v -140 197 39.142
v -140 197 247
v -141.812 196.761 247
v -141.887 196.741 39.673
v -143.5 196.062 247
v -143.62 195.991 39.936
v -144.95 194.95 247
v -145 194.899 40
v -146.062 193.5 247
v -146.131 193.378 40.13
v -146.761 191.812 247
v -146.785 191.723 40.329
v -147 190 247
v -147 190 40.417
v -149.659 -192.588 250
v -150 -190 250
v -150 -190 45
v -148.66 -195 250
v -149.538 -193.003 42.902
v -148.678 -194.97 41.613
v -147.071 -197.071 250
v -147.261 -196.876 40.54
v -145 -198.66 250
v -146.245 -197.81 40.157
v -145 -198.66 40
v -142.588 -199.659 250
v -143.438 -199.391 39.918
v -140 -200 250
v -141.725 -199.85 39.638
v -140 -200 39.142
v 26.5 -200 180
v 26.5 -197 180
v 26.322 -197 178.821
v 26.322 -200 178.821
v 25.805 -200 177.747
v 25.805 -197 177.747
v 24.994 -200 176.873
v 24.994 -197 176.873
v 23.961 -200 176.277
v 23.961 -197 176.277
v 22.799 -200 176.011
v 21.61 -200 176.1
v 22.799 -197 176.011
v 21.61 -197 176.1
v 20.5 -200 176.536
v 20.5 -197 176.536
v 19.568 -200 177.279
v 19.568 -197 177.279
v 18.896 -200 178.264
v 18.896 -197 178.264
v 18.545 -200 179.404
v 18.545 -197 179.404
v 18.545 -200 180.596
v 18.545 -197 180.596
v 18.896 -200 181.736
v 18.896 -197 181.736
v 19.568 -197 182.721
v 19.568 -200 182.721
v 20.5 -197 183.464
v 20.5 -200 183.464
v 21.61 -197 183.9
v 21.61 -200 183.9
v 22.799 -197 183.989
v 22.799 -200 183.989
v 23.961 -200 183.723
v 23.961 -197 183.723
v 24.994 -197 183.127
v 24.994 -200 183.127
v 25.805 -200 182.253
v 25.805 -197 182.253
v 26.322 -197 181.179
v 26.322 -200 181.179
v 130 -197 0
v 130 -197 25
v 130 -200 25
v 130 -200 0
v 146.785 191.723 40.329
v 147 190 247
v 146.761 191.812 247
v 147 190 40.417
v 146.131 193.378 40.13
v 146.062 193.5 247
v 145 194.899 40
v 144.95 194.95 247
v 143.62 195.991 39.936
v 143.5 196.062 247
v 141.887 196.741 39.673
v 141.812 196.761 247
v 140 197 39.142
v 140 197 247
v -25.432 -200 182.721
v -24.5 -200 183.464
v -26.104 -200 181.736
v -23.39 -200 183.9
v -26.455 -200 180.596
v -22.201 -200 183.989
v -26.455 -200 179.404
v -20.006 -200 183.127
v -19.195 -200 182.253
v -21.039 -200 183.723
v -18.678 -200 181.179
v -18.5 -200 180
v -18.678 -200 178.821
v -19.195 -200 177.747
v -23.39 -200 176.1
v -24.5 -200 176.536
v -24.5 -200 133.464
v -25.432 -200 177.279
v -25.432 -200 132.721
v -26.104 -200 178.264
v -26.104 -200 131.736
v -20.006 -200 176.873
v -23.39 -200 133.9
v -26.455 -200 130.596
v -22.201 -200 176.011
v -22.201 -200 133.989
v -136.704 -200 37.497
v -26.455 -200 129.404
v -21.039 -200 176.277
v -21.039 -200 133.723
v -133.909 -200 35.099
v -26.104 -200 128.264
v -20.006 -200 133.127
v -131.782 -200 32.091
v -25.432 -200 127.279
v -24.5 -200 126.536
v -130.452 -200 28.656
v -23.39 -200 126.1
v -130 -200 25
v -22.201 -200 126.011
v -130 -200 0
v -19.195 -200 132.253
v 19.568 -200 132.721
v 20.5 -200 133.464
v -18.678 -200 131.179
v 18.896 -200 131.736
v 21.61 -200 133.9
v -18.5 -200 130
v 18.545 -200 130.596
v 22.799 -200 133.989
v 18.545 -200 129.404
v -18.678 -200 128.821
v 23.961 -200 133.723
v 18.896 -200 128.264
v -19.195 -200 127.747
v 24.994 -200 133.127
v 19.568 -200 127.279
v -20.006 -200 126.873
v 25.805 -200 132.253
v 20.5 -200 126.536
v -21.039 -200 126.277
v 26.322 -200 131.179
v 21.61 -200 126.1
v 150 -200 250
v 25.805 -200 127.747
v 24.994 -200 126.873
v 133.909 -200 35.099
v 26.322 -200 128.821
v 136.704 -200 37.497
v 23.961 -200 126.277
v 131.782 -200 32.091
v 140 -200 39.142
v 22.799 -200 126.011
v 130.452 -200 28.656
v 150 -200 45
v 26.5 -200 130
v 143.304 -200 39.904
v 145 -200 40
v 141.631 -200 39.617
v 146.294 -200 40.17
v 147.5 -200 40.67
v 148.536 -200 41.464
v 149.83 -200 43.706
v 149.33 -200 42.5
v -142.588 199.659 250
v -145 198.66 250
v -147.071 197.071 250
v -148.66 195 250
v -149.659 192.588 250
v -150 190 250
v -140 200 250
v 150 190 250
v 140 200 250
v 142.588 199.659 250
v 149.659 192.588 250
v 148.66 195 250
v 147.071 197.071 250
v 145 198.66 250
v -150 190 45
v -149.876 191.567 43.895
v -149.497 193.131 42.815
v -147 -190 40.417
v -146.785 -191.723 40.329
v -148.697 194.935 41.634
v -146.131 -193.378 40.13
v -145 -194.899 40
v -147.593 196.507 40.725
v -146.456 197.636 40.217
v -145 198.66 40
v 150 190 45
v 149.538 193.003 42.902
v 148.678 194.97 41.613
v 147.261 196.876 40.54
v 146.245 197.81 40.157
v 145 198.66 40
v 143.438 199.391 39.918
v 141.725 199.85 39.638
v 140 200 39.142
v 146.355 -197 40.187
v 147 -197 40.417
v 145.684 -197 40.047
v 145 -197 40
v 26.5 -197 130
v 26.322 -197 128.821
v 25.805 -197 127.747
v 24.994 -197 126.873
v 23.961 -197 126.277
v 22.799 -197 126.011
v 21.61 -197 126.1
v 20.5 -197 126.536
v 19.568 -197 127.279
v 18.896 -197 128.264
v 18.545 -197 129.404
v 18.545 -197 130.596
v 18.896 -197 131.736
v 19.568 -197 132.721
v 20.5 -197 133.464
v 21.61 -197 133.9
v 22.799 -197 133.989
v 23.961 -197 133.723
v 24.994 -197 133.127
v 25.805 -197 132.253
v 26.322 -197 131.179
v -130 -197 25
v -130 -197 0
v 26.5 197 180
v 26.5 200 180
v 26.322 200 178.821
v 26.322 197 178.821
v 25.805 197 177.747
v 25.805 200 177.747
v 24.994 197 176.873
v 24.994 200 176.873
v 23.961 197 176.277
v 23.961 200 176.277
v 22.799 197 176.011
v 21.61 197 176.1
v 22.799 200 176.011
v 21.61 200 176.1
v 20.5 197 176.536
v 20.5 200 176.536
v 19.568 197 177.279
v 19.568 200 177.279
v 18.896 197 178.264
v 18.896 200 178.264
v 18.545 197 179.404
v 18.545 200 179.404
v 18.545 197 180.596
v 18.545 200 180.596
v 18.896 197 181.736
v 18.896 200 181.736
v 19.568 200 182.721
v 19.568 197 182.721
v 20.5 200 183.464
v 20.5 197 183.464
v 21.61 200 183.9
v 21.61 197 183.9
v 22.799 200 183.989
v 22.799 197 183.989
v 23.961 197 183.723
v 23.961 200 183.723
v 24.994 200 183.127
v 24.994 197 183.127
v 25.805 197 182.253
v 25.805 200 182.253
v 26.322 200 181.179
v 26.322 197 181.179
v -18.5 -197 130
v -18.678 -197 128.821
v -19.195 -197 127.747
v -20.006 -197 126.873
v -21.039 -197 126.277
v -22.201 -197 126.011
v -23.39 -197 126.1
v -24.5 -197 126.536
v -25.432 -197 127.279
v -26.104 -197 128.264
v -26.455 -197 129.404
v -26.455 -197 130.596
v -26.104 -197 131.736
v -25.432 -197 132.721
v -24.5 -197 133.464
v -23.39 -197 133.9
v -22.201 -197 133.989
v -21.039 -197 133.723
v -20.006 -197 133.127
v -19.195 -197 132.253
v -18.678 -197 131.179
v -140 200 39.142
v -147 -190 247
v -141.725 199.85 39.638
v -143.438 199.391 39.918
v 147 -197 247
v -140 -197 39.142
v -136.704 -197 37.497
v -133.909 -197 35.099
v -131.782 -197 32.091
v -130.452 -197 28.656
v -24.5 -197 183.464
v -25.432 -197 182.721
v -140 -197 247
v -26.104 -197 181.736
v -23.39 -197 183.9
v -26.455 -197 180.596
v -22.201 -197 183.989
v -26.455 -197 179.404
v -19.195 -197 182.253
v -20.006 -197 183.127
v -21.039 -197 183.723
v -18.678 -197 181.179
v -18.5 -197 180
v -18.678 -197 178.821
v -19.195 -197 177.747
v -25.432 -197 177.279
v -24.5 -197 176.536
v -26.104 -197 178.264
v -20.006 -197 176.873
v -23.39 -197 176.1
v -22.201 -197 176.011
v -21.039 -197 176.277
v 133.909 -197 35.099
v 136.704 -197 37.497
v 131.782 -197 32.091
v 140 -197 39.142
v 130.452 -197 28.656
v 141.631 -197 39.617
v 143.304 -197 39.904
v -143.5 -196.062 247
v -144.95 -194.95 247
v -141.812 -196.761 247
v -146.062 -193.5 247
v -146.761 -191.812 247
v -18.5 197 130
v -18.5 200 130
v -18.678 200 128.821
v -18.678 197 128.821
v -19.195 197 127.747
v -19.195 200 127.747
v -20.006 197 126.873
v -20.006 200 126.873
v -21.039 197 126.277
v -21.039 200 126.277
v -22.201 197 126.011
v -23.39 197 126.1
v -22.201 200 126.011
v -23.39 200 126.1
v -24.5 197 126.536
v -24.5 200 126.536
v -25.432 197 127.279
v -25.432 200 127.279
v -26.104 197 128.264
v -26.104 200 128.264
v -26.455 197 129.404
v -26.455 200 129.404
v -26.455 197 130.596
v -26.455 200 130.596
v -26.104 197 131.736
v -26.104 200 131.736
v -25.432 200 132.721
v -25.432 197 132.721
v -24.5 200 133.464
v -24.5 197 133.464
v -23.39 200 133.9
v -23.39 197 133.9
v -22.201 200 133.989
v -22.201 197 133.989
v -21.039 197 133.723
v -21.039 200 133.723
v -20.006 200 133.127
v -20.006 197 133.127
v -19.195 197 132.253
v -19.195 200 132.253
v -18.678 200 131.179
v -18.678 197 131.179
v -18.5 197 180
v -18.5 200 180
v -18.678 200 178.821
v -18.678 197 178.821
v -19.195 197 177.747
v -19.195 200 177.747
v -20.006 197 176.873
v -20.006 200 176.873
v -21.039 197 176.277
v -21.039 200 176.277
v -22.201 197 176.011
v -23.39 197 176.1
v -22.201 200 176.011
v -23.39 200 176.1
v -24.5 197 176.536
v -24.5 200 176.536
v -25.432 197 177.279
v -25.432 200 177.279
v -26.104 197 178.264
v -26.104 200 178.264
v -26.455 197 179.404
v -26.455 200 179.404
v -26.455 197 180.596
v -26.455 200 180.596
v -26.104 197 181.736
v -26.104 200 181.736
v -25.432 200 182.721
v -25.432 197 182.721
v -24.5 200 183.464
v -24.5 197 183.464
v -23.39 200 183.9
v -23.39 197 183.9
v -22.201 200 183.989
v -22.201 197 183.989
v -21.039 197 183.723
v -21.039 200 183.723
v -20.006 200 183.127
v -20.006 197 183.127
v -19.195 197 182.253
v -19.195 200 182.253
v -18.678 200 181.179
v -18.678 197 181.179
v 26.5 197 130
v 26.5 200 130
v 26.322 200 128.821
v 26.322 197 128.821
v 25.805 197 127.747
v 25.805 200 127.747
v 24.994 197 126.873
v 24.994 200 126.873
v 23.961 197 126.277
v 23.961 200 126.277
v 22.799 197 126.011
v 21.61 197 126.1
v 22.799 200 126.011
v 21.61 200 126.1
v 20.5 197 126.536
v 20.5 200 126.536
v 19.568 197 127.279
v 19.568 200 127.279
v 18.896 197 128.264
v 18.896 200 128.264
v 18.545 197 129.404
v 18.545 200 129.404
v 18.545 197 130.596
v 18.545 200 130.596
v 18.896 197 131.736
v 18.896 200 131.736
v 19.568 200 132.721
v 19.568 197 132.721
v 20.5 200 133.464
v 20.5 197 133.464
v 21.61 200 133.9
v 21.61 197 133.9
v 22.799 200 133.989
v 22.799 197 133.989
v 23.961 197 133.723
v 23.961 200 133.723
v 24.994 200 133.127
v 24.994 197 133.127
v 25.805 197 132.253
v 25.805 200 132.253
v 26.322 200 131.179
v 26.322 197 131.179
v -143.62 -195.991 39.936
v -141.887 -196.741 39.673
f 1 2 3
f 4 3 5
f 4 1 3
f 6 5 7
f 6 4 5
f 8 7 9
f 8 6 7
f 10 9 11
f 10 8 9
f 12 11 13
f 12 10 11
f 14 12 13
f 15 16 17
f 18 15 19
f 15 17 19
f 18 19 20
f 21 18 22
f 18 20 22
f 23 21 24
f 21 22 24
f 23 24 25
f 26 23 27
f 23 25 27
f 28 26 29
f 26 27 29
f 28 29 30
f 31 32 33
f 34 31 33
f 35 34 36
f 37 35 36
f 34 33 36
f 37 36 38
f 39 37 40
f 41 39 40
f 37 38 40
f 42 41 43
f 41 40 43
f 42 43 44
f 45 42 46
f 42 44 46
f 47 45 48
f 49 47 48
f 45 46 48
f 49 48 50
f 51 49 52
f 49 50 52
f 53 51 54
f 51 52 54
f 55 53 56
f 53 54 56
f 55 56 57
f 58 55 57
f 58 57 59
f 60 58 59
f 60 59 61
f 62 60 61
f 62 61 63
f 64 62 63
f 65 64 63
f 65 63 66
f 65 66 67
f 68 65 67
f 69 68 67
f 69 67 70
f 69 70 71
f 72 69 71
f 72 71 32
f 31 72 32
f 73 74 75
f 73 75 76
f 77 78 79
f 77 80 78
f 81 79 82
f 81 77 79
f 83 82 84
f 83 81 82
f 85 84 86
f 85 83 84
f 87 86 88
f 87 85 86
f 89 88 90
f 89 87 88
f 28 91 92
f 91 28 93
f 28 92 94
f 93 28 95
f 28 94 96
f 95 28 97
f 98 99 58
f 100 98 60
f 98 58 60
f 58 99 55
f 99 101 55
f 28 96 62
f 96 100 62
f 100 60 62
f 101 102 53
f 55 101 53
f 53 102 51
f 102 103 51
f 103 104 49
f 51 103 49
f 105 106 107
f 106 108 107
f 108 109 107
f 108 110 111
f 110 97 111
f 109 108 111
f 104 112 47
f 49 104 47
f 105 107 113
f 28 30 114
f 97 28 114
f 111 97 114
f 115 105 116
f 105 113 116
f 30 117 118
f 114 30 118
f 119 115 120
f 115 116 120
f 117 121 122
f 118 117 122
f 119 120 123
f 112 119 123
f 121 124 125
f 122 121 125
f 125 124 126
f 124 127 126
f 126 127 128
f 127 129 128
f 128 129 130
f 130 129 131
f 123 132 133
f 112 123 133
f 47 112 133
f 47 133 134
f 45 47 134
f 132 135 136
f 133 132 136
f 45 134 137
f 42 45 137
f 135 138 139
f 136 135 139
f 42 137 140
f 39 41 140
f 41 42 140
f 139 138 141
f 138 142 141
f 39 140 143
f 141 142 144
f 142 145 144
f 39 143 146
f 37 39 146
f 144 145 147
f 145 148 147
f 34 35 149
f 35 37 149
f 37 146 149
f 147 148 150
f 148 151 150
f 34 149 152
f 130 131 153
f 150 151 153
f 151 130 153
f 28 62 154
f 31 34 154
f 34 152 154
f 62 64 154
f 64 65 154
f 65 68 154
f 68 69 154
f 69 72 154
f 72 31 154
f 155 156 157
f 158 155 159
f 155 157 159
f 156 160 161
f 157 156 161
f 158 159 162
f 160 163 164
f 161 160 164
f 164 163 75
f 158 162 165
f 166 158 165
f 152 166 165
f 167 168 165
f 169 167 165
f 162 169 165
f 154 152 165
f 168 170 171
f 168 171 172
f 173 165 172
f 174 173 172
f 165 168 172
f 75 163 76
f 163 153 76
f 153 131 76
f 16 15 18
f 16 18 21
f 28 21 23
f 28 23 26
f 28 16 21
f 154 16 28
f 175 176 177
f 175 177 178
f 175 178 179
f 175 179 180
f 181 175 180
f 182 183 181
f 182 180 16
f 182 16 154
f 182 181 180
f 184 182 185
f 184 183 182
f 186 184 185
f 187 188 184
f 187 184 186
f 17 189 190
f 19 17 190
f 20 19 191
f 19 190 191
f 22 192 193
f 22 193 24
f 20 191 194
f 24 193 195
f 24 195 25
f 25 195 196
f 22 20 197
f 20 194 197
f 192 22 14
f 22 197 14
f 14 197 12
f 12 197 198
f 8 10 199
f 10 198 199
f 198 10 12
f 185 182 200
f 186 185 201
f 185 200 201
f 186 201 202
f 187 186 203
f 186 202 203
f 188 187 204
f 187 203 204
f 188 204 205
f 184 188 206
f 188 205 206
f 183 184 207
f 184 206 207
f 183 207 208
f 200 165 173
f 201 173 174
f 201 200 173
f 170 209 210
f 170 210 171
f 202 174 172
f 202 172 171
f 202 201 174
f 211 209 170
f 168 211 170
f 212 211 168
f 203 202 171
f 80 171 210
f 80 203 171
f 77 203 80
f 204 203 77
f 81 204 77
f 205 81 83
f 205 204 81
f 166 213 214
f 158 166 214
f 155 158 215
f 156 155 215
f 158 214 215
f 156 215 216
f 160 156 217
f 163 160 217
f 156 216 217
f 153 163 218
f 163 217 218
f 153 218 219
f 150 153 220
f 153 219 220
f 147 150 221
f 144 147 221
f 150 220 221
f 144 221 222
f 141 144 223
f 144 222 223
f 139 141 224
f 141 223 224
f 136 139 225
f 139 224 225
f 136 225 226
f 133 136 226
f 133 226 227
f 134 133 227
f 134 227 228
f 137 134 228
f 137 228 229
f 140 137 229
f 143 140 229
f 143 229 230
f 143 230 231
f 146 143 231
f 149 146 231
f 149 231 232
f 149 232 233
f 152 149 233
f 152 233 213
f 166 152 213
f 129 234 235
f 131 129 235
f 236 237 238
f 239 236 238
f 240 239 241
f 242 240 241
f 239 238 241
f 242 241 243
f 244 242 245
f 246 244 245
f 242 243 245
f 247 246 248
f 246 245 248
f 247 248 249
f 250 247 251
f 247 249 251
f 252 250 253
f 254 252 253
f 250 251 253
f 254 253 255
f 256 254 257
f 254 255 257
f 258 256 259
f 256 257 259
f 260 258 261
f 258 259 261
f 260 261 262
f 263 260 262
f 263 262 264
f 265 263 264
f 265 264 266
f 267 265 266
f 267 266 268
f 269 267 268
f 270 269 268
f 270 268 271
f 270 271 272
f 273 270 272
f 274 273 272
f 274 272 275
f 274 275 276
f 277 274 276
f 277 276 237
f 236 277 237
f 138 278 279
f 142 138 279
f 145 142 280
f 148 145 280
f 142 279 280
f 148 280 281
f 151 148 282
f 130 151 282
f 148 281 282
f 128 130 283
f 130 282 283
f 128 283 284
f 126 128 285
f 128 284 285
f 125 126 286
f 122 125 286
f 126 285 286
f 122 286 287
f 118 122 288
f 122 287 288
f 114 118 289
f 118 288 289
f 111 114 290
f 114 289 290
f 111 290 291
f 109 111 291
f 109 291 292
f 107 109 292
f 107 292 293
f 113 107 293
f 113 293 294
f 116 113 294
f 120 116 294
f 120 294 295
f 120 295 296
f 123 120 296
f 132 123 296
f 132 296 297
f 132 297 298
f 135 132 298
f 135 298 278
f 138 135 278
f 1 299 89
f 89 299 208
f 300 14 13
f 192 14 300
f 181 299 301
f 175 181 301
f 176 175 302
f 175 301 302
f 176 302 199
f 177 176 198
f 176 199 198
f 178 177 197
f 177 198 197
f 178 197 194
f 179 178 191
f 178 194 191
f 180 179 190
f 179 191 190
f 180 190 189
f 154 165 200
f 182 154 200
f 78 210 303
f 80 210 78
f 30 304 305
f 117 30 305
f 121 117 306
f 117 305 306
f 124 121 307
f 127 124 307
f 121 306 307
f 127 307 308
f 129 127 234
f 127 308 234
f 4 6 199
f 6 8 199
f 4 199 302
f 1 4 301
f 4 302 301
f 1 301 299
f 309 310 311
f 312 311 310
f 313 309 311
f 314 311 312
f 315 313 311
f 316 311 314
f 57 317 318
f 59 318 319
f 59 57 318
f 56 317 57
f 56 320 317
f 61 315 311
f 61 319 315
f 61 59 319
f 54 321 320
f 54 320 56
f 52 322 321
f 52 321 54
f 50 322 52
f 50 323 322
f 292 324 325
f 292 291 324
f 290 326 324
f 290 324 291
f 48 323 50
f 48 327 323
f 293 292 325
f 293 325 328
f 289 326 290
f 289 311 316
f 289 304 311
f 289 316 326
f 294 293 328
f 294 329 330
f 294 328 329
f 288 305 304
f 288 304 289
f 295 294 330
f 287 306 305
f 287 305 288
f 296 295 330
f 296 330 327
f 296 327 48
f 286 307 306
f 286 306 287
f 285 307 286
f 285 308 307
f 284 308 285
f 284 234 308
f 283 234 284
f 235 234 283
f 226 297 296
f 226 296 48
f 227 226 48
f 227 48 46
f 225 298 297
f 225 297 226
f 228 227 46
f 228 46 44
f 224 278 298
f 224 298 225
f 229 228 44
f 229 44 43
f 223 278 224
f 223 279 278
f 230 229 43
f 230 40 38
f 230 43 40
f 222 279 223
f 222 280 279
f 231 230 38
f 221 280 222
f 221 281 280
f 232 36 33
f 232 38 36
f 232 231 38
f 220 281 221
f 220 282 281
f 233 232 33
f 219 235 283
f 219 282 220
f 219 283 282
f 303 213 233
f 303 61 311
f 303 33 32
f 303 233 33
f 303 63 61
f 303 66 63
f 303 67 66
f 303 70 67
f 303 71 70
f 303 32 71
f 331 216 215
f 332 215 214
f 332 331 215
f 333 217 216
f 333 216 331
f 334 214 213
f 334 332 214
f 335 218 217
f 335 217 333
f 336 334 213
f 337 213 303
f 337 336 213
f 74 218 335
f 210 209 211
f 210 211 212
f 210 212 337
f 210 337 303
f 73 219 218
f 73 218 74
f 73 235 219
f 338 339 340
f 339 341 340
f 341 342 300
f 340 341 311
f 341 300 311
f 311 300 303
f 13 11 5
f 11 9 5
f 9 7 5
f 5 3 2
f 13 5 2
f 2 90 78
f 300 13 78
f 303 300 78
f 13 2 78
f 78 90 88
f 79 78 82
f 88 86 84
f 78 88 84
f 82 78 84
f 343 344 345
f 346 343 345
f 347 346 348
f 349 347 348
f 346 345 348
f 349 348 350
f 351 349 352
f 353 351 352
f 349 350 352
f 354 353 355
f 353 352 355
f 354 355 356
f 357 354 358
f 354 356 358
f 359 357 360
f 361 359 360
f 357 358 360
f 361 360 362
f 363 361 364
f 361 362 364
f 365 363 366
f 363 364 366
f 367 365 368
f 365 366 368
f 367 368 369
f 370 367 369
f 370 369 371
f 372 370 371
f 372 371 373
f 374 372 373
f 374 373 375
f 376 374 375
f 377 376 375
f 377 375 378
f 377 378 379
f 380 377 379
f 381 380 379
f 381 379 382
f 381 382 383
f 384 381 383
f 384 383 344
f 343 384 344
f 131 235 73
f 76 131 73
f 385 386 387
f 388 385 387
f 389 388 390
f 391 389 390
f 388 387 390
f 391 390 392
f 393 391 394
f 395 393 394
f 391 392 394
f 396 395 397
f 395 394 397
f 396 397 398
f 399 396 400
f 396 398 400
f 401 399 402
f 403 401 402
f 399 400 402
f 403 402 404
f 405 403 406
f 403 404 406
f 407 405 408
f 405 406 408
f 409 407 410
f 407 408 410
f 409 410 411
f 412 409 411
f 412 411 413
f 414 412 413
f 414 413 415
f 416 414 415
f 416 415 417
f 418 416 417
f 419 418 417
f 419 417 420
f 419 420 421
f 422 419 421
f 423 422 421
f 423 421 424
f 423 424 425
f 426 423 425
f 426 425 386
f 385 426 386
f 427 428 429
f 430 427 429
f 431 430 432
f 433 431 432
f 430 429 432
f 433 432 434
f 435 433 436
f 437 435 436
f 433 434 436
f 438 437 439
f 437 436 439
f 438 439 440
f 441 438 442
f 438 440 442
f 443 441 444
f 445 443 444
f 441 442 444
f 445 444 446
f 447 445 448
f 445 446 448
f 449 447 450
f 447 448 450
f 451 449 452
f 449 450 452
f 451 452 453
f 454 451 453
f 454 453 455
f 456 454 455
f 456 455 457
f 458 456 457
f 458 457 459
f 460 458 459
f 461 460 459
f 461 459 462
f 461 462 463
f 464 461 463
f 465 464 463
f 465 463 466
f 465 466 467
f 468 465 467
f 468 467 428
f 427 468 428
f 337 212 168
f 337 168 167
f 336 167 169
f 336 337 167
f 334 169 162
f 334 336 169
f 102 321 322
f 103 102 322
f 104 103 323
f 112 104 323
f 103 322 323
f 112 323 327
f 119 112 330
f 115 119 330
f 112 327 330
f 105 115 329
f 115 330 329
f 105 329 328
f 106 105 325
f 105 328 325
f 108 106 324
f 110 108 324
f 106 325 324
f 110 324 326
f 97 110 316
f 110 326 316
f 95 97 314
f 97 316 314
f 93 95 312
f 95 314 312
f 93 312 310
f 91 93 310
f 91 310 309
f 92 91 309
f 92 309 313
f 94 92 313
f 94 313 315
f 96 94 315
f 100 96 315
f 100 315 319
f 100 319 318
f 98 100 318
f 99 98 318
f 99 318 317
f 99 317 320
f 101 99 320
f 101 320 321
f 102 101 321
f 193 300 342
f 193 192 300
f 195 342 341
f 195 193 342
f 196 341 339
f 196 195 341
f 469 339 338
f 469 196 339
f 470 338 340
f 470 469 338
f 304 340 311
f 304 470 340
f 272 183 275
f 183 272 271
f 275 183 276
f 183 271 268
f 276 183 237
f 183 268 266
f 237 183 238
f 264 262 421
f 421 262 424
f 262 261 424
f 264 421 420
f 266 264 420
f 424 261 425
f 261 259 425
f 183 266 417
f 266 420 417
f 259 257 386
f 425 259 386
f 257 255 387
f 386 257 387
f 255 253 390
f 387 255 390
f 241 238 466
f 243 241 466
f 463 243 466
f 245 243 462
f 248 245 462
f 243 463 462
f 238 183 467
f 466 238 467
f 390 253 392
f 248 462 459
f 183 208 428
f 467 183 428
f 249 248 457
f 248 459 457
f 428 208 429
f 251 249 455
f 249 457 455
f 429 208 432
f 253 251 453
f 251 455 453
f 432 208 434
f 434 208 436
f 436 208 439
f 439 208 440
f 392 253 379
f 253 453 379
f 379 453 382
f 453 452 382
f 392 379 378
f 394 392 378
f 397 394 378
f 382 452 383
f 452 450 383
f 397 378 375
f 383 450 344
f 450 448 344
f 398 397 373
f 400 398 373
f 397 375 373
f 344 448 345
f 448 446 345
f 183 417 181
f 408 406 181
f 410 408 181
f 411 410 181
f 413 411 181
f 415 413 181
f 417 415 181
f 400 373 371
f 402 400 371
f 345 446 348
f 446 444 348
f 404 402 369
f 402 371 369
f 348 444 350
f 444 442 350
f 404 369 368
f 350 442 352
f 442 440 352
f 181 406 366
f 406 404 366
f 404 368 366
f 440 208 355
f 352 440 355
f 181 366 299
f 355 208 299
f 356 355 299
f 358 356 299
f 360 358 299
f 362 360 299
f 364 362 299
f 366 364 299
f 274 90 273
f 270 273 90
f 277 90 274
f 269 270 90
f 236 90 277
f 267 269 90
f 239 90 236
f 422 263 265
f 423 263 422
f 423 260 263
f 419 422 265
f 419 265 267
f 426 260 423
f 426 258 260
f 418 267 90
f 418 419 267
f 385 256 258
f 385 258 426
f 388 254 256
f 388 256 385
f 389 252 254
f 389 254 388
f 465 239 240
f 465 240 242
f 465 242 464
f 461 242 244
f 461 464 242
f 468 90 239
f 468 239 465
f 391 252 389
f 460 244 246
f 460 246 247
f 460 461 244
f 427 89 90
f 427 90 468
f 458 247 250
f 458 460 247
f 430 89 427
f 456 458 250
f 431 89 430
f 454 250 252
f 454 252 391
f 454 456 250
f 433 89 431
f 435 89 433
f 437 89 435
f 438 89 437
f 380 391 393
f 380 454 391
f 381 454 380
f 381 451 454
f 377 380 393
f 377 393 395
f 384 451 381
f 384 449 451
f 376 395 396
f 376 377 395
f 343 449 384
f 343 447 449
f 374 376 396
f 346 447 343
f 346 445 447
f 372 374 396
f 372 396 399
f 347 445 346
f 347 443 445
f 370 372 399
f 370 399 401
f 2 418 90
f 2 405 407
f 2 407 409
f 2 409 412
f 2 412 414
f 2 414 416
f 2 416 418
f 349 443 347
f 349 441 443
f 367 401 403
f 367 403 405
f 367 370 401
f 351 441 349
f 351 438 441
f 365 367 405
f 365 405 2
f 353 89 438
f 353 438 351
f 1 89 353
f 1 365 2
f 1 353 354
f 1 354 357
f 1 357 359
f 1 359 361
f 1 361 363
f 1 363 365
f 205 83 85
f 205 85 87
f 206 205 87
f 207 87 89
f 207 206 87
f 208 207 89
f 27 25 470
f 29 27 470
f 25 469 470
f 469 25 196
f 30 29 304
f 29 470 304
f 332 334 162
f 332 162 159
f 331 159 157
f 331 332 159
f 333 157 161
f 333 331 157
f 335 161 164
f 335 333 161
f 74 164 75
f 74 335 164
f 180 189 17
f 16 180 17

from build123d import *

# Parameters (mm, degrees)
BOSS_EXTRUDE1_DEPTH = 250
SHELL1_T            = -3
SKETCH4_R           = 4
CUT_EXTRUDE1_DEPTH  = 401
CUT_EXTRUDE3_DEPTH  = 400
CUT_EXTRUDE4_DEPTH  = 414
SKETCH7_W           = 291.024636147
SKETCH7_H           = 48.584181262
CUT_EXTRUDE5_DEPTH  = 232


with BuildPart() as part:
    # Sketch2 → Boss-Extrude1 (new body)
    with BuildSketch(Plane.XY):
        with BuildLine():
            Line((-140, -200), (150, -200))
            Line((150, -200), (150, 190))
            ThreePointArc((150, 190), (147.071067812, 197.071067812), (140, 200))
            Line((140, 200), (-140, 200))
            ThreePointArc((-140, 200), (-147.071067812, 197.071067812), (-150, 190))
            Line((-150, 190), (-150, -190))
            ThreePointArc((-150, -190), (-147.071067812, -197.071067812), (-140, -200))
        make_face()
    extrude(amount=BOSS_EXTRUDE1_DEPTH)

    # Shell1
    shell1_openings = [part.faces().sort_by_distance(p)[0] for p in [
        (-20.29586683, 27.438723973, 0),
    ]]
    offset(amount=SHELL1_T, openings=shell1_openings, kind=Kind.INTERSECTION)

    # Sketch4 → Cut-Extrude1 (cut, through all)
    with BuildSketch(Plane(origin=(0, 200, 0), x_dir=(1, 0, 0), z_dir=(0, 1, 0))):
        with Locations((-22.5, -130)):
            Circle(SKETCH4_R)
        with Locations((22.5, -130)):
            Circle(SKETCH4_R)
        with Locations((-22.5, -180)):
            Circle(SKETCH4_R)
        with Locations((22.5, -180)):
            Circle(SKETCH4_R)
    extrude(amount=-CUT_EXTRUDE1_DEPTH, mode=Mode.SUBTRACT)

    # Sketch6 → Cut-Extrude3 (cut)
    with BuildSketch(Plane(origin=(0, 200, 0), x_dir=(1, 0, 0), z_dir=(0, 1, 0))):
        with BuildLine():
            Line((-140, -39.142135624), (-140, 0))
            Line((-140, 0), (-150, 0))
            Line((-150, 0), (-150, -45))
            ThreePointArc((-150, -45), (-148.535533906, -41.464466094), (-145, -40))
            ThreePointArc((-145, -40), (-142.463470319, -39.783978395), (-140, -39.142135624))
        make_face()
    cut_extrude3 = extrude(amount=-CUT_EXTRUDE3_DEPTH, mode=Mode.SUBTRACT)

    # Sketch6<3> → Cut-Extrude4 (cut)
    with BuildSketch(Plane(origin=(0, 200, 0), x_dir=(1, 0, 0), z_dir=(0, 1, 0))):
        with BuildLine():
            Line((-130, -25), (-130, 0))
            Line((-130, 0), (-140, 0))
            Line((-140, 0), (-140, -39.142135624))
            ThreePointArc((-140, -39.142135624), (-132.752551286, -33.660254038), (-130, -25))
        make_face()
    cut_extrude4 = extrude(amount=-CUT_EXTRUDE4_DEPTH, mode=Mode.SUBTRACT)

    # Mirror1: Cut-Extrude3, Cut-Extrude4 across plane
    add(cut_extrude3.mirror(Plane(origin=(0, 0, 0), x_dir=(0, 0, 1), z_dir=(1, 0, 0))), mode=Mode.SUBTRACT)
    add(cut_extrude4.mirror(Plane(origin=(0, 0, 0), x_dir=(0, 0, 1), z_dir=(1, 0, 0))), mode=Mode.SUBTRACT)

    # Sketch7 → Cut-Extrude5 (cut)
    with BuildSketch(Plane(origin=(0, 200, 0), x_dir=(1, 0, 0), z_dir=(0, 1, 0))):
        with Locations((5.512318073, -14.850044993)):
            Rectangle(SKETCH7_W, SKETCH7_H)
    extrude(amount=-CUT_EXTRUDE5_DEPTH, mode=Mode.SUBTRACT)


solid = part.part
